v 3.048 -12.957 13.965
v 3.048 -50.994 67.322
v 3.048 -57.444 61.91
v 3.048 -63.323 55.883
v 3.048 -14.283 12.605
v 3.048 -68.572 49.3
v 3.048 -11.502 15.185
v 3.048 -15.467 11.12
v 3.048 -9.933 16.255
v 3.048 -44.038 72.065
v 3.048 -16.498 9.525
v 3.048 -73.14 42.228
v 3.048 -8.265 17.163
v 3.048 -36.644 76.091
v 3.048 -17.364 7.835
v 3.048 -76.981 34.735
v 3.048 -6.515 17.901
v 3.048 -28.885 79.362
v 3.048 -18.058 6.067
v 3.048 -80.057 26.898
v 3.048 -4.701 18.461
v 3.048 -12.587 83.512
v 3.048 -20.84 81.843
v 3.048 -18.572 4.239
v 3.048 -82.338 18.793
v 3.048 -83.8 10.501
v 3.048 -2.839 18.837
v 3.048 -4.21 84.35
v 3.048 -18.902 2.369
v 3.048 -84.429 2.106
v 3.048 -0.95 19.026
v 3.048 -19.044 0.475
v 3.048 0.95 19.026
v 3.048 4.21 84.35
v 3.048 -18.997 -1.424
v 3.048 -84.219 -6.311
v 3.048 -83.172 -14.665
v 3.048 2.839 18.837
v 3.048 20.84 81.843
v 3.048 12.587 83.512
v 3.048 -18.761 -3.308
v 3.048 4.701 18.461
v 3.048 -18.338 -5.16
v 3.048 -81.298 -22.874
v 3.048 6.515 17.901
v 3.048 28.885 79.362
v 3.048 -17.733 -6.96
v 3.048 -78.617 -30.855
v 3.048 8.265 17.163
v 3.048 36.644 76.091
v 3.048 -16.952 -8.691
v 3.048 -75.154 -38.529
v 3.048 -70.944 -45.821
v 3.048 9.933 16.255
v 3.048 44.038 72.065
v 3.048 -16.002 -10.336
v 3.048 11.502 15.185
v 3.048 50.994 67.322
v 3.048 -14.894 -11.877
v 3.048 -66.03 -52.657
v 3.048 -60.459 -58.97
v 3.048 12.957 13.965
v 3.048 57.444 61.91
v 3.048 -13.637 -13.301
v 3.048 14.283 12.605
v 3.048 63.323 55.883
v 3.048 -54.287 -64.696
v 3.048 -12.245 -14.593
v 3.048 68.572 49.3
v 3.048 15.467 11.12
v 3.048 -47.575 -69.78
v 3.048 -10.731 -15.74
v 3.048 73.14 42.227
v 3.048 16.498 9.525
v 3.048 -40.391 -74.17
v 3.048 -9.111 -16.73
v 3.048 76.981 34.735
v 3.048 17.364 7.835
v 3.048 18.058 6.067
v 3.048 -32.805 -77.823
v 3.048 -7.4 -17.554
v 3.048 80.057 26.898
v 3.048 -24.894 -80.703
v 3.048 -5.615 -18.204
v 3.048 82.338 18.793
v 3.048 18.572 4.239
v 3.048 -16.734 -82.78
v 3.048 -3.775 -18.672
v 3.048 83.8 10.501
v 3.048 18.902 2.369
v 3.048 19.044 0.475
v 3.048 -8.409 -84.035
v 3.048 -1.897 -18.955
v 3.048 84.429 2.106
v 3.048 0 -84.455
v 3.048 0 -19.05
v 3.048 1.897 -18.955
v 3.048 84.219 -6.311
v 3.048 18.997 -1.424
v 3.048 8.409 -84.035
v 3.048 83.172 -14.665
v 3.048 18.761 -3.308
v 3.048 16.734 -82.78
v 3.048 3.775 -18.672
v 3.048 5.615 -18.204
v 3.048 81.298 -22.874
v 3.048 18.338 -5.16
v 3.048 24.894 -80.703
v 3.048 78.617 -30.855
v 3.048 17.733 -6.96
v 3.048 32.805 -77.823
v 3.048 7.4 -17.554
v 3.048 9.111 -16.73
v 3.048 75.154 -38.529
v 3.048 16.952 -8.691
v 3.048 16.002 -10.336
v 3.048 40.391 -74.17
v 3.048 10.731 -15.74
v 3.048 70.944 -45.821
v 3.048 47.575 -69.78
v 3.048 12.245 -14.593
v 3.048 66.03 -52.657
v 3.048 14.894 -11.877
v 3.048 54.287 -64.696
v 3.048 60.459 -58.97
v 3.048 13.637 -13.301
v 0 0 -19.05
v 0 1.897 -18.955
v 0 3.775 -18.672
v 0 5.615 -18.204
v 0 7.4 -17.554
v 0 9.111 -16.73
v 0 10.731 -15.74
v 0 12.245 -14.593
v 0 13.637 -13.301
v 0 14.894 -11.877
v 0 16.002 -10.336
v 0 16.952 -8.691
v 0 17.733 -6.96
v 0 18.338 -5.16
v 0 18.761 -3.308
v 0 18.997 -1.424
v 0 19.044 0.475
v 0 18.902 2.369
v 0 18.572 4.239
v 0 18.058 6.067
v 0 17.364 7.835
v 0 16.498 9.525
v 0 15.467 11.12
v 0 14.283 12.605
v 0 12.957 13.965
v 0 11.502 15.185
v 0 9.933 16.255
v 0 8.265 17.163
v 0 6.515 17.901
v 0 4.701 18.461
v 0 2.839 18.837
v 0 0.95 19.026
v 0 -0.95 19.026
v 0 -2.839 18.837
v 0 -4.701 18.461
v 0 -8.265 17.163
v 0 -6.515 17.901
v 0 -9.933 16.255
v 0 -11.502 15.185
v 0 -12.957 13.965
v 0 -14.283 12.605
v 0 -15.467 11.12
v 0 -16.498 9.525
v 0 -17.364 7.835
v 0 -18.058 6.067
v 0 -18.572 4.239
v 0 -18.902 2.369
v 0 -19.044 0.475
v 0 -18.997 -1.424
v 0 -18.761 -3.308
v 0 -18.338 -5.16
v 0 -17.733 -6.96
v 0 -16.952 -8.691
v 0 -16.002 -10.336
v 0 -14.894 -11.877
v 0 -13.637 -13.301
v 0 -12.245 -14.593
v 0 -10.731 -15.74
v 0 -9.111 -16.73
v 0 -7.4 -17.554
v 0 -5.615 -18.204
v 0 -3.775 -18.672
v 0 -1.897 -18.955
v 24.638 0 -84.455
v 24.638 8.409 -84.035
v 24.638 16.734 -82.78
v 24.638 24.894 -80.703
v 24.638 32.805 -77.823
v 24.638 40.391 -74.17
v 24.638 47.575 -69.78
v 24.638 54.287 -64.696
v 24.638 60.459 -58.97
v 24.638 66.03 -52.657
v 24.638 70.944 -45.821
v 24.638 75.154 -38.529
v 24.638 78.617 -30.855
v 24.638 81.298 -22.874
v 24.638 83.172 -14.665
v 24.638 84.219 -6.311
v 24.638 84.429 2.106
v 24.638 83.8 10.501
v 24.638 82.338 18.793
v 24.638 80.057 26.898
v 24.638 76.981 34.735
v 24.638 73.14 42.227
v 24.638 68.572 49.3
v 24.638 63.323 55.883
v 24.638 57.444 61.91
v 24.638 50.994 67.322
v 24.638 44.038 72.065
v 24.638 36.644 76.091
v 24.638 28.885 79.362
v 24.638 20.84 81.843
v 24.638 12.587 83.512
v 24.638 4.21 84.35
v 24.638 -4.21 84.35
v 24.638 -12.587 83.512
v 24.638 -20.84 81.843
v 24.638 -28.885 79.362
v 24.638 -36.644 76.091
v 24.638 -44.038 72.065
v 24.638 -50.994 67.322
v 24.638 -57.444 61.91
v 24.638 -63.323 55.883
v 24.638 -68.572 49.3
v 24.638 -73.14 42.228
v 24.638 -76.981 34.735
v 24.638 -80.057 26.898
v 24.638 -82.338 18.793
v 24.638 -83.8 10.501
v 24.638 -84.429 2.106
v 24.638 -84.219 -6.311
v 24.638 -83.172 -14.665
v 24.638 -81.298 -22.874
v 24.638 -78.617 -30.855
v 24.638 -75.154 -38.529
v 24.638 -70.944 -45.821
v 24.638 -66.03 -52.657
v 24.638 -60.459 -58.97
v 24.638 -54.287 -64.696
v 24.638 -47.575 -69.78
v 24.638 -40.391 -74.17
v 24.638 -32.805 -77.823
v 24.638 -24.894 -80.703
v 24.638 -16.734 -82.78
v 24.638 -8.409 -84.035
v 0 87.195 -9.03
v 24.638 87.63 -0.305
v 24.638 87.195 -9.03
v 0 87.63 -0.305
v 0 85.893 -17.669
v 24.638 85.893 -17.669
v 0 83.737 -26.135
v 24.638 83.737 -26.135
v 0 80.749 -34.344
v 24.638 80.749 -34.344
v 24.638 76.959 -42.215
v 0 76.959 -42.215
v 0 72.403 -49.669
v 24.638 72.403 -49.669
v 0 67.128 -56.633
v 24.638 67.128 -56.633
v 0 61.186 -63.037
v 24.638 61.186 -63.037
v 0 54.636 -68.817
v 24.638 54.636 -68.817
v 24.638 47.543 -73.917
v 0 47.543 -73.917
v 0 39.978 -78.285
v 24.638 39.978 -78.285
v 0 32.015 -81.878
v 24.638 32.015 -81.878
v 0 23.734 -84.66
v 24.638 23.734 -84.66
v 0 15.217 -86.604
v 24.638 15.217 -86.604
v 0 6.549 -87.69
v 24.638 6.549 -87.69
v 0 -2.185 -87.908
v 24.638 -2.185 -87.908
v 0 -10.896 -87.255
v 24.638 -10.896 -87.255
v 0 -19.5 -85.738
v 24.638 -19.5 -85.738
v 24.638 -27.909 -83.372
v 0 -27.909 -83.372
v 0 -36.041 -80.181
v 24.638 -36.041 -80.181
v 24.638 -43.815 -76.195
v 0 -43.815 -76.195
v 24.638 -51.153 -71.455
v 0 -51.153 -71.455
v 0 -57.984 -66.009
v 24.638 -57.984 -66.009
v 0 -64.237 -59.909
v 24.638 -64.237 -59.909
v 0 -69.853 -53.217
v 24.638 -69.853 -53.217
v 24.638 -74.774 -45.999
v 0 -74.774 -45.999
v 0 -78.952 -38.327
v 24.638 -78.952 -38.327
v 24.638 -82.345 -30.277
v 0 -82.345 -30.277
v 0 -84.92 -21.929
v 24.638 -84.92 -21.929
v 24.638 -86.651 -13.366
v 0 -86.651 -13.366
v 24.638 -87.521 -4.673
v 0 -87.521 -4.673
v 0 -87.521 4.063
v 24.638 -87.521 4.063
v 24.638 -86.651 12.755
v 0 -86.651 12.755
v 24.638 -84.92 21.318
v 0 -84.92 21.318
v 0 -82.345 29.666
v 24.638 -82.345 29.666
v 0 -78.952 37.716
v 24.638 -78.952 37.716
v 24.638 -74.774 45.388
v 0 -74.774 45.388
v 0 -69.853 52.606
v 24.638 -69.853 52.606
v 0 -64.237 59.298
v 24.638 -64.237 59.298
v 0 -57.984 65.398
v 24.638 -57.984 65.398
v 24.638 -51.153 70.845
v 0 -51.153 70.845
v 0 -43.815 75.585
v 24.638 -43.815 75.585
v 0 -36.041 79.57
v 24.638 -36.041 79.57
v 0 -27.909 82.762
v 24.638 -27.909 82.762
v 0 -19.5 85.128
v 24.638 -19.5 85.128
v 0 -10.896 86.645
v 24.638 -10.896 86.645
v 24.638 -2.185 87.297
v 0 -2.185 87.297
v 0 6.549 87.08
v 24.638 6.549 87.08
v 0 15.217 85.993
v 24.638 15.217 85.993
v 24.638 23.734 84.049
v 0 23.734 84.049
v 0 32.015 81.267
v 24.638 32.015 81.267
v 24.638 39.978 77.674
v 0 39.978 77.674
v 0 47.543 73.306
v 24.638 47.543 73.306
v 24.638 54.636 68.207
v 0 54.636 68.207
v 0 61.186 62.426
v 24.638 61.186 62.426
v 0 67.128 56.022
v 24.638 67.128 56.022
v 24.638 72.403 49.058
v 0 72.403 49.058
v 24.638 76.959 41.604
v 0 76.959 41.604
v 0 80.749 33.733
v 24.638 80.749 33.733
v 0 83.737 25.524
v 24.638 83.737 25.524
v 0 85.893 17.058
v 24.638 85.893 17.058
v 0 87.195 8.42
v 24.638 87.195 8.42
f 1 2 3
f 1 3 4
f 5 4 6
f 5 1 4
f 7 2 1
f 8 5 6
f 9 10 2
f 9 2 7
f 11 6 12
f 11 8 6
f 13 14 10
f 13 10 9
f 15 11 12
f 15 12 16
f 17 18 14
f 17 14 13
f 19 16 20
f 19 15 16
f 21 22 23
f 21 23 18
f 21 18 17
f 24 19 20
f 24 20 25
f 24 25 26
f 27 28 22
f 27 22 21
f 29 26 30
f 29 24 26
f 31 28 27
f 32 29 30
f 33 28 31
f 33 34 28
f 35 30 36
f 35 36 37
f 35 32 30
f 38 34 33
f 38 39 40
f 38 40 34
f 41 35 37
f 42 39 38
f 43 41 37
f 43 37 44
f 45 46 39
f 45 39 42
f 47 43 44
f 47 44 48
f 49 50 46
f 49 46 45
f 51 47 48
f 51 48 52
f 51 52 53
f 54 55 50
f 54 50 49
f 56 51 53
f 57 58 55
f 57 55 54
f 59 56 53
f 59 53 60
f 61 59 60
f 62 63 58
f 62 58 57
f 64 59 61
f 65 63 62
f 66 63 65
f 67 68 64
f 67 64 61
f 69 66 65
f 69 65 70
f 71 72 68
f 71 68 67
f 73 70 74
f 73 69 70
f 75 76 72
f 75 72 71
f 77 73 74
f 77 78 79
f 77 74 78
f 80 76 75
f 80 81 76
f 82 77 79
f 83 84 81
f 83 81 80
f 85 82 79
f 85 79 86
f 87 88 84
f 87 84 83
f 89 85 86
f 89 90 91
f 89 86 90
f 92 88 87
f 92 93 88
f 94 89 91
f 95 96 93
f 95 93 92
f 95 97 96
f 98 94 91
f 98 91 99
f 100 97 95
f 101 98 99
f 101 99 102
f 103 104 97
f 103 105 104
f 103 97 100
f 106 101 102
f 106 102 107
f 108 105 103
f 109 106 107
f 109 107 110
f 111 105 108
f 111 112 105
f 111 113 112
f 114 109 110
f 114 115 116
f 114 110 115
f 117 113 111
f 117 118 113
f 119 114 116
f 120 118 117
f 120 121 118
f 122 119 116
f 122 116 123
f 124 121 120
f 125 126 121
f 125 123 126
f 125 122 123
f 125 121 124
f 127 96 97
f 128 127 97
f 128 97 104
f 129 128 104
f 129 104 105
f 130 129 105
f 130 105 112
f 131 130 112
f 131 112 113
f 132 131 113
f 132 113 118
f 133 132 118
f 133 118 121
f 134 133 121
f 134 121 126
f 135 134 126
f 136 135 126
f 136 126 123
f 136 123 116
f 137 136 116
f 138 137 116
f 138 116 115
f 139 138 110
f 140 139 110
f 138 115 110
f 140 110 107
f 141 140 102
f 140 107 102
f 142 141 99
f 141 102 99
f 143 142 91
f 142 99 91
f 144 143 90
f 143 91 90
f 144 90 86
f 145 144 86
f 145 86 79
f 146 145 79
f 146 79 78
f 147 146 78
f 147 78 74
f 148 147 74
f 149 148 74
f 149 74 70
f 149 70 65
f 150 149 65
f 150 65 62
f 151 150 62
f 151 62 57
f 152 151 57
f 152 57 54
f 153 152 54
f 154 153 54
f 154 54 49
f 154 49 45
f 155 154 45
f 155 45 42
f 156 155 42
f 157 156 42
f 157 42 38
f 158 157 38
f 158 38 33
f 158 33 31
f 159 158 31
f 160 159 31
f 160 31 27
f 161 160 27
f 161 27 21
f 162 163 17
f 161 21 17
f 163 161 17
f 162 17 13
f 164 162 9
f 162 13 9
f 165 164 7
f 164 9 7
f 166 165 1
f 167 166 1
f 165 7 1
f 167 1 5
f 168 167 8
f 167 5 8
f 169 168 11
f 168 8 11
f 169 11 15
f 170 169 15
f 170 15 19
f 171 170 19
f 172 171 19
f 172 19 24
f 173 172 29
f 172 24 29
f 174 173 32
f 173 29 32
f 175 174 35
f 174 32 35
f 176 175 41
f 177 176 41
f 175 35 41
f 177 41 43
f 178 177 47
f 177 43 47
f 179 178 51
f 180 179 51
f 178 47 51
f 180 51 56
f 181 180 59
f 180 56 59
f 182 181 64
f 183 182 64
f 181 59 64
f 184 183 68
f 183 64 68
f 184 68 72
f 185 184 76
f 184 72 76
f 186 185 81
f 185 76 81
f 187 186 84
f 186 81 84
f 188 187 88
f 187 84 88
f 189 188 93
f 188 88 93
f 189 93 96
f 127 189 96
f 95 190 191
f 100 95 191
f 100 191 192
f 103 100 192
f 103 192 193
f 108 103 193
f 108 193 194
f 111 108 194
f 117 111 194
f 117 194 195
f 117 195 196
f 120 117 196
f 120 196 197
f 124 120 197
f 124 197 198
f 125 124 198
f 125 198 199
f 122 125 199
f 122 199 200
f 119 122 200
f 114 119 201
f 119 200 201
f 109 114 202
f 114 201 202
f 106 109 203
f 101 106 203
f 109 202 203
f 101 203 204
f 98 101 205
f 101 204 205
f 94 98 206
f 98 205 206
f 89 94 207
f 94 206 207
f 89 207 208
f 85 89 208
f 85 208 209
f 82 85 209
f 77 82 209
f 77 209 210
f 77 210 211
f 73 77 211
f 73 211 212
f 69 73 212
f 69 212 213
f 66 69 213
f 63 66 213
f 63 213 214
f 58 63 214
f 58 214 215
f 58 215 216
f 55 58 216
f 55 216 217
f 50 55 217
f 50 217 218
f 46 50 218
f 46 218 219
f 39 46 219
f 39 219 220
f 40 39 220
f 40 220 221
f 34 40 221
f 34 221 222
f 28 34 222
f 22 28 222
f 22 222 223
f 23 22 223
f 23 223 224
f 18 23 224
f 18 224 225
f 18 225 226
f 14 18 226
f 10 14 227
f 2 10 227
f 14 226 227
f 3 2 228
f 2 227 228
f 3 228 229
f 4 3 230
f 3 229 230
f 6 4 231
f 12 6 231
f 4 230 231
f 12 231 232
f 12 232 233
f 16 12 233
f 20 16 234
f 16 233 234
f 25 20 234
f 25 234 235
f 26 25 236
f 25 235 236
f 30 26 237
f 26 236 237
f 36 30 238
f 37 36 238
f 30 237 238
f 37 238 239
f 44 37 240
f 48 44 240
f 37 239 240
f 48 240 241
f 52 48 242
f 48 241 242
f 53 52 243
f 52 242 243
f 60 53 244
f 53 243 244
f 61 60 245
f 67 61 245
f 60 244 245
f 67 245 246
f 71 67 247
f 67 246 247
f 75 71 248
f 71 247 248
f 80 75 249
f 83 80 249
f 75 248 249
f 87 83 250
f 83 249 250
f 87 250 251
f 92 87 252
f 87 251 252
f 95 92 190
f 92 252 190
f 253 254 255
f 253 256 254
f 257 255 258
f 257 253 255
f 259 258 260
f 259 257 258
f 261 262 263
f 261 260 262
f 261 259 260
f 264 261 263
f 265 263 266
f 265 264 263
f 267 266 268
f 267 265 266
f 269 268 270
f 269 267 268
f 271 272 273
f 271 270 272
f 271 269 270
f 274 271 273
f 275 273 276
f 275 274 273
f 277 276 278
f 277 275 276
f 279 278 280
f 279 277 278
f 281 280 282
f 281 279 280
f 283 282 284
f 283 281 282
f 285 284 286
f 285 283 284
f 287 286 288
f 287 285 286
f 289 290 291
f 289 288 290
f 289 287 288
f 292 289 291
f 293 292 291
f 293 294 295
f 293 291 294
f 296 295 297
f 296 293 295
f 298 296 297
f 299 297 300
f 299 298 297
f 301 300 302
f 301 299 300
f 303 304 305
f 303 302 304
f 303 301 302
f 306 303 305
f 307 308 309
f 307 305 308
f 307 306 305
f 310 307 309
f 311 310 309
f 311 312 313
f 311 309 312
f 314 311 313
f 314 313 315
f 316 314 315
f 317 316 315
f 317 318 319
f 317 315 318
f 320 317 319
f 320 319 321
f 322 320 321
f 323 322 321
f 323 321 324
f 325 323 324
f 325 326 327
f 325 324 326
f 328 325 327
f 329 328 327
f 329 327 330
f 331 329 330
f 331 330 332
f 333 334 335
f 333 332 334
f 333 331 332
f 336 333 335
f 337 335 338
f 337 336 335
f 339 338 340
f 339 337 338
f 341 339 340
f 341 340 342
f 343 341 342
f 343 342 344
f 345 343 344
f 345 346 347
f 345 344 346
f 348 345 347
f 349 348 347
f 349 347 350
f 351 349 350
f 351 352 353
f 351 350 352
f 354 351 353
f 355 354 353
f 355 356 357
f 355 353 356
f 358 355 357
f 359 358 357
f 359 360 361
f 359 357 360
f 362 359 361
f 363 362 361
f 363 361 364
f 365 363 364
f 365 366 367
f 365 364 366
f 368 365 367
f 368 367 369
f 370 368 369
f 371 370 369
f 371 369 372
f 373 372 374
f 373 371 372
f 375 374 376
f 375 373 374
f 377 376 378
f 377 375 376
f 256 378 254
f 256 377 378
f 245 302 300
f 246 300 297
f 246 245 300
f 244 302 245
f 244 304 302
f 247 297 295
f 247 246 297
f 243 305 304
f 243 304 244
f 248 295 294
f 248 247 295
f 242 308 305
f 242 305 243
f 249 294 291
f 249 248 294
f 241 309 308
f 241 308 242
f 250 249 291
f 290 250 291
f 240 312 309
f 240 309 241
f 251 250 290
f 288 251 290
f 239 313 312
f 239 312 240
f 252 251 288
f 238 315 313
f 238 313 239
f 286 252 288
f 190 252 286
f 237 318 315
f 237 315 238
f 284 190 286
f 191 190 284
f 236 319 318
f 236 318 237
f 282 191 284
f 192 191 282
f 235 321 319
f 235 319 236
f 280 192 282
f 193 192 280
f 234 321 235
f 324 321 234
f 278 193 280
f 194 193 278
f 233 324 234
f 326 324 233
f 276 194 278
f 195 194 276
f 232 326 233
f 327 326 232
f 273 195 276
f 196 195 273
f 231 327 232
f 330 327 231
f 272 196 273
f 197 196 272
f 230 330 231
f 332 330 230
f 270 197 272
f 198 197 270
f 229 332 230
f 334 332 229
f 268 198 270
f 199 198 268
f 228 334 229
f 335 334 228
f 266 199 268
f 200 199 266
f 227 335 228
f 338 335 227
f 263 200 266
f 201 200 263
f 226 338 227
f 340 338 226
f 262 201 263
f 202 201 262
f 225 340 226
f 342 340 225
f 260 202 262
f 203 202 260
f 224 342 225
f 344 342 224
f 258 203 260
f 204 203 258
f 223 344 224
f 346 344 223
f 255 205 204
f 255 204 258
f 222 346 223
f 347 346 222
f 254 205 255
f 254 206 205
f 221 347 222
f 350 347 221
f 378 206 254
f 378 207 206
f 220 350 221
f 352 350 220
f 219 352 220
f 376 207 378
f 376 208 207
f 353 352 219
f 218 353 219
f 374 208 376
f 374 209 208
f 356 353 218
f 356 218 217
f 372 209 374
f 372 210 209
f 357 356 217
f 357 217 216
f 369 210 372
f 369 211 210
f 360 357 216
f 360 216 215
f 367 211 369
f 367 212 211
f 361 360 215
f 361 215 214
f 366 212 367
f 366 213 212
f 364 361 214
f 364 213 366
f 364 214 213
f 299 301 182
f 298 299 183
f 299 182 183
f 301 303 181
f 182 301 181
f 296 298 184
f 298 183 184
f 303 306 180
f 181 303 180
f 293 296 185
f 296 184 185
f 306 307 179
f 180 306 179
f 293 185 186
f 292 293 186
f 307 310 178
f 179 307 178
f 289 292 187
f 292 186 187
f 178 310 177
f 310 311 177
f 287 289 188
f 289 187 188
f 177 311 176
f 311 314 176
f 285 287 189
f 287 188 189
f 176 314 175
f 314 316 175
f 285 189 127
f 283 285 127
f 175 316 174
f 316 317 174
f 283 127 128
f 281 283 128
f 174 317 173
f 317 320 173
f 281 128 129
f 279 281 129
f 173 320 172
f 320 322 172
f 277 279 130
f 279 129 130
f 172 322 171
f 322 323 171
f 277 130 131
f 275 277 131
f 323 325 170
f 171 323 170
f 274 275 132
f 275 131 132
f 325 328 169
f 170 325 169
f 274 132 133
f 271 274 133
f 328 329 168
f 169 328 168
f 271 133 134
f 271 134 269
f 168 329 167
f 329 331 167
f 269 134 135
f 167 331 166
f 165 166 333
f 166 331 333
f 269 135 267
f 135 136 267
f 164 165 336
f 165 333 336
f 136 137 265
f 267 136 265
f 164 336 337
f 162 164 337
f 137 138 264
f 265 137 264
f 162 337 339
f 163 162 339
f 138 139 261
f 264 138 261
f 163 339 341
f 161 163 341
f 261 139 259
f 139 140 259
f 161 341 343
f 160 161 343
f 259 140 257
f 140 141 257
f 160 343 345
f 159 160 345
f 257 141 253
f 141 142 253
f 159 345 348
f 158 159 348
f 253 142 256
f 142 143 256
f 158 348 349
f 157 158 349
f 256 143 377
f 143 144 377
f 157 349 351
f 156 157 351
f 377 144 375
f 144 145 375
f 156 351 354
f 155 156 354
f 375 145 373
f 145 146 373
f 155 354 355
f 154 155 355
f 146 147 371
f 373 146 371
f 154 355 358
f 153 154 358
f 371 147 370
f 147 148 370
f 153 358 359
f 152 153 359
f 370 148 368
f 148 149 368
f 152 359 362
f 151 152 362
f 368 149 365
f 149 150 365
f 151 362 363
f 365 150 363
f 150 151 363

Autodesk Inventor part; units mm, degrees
ref_plane "YZ Plane" through (0, 0, 0) normal (1, 0, 0) x (0, 1, 0)
ref_plane "XZ Plane" through (0, 0, 0) normal (0, 1, 0) x (-1, 0, 0)
ref_plane "XY Plane" through (0, 0, 0) normal (0, 0, 1) x (1, 0, 0)
sketch "Sketch1" plane through (0, 0, 0) normal (1, 0, 0) x (0, 1, 0)
  circle A0 centre (0, -0.3053) radius 87.63
  point P0 (0, 0)
  dimension "d0" = 175.26
extrude "Extrusion1" add sketch "Sketch1" along normal blind 24.638
sketch "Sketch2" plane through (24.638, 0, -0.3053) normal (1, 0, 0) x (0, 0, -1)
  circle A0 centre (-0.3053, 0) radius 84.455
  dimension "d3" = 168.91
extrude "Cut1" cut sketch "Sketch2" against normal blind 21.59
sketch "Sketch3" plane through (3.048, 0, 0) normal (1, 0, 0) x (0, 0, -1)
  circle A0 centre (0, 0) radius 84.455 projected
  circle A1 centre (0, 0) radius 19.05
  dimension "d6" = 38.1
extrude "Cut2" cut sketch "Sketch3" against normal up to next contours A1
equation "\"d7\" = Thickness"
equation "\"BendRadius\" = Thickness"
equation "\"BendReliefWidth\" = Thickness"
equation "\"BendReliefDepth\" = 0.5 * Thickness"
equation "\"CornerReliefSize\" = 4 * Thickness"
equation "\"MinimumRemnant\" = 2 * Thickness"
equation "\"TransitionRadius\" = BendRadius"
equation "\"JacobiRadiusSize\" = BendRadius"
equation "\"GapSize\" = Thickness"
equation "\"Thickness\" = 3.048"
properties part number "Ground_shield_v2" material "Steel, Chrome Plated"
